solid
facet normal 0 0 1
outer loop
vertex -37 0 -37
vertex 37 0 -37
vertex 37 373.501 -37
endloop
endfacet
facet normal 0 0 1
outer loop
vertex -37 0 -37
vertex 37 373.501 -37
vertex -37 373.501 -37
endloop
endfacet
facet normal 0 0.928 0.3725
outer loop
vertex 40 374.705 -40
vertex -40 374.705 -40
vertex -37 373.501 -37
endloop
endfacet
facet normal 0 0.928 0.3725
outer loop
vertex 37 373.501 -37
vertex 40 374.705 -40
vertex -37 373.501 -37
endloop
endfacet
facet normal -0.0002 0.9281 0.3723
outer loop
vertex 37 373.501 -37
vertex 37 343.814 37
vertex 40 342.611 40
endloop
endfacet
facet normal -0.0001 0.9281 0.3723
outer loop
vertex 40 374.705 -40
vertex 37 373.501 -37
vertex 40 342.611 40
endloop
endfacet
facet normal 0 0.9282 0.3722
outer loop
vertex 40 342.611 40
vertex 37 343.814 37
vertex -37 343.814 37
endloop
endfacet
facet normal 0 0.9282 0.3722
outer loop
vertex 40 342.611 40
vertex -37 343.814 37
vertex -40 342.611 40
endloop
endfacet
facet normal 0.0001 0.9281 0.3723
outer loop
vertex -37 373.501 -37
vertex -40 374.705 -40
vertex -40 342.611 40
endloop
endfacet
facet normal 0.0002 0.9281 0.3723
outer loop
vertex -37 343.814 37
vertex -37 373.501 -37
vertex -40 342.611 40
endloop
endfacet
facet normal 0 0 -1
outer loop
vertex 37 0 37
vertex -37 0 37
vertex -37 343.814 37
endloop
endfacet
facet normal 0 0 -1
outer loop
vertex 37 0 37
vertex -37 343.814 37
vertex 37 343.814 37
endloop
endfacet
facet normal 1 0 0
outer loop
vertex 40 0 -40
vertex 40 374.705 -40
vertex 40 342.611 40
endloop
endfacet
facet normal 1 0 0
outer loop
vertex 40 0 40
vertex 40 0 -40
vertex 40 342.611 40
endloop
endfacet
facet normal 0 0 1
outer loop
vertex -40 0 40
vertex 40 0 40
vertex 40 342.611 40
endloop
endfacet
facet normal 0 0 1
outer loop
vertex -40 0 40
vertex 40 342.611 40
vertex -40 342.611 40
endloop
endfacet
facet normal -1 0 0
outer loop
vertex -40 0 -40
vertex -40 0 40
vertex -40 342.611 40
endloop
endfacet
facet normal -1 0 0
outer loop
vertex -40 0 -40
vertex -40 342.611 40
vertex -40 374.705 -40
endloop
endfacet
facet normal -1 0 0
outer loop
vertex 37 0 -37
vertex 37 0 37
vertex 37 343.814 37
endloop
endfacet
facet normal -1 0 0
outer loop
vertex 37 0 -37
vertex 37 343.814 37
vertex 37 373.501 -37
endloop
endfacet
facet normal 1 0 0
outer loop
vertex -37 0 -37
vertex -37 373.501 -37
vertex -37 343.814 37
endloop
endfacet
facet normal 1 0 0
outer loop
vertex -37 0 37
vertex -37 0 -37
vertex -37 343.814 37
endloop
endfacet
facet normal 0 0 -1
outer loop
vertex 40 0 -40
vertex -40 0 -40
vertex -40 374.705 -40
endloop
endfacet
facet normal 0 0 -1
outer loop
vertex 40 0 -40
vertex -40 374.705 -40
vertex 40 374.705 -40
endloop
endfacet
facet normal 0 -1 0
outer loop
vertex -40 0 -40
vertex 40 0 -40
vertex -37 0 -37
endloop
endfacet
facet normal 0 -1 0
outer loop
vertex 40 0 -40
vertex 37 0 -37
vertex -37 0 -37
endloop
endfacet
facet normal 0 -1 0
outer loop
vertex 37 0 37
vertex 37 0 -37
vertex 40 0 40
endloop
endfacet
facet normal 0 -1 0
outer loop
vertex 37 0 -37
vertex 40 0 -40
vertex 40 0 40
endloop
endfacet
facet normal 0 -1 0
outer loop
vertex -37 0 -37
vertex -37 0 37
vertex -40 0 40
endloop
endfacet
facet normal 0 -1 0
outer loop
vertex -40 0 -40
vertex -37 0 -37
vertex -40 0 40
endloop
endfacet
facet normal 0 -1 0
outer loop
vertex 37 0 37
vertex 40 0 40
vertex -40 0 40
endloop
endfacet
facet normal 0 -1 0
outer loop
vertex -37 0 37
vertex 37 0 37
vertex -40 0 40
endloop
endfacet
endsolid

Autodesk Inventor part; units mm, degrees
ref_plane "YZ Plane" through (0, 0, 0) normal (1, 0, 0) x (0, 1, 0)
ref_plane "XZ Plane" through (0, 0, 0) normal (0, 1, 0) x (-1, 0, 0)
ref_plane "XY Plane" through (0, 0, 0) normal (0, 0, 1) x (1, 0, 0)
sketch "Sketch1" plane through (0, 0, 0) normal (0, 1, 0) x (-1, 0, 0)
  line L0 (40, -40) -> (-40, -40)
  line L1 (-40, -40) -> (-40, 40)
  line L2 (-40, 40) -> (40, 40)
  line L3 (40, 40) -> (40, -40)
  line L4 (40, -40) -> (-40, 40) construction
  line L5 (-40, -40) -> (40, 40) construction
  line L6 (-37, -37) -> (37, -37)
  line L7 (37, -37) -> (37, 37)
  line L8 (37, 37) -> (-37, 37)
  line L9 (-37, 37) -> (-37, -37)
  point P0 (0, 0)
  dimension "d0" = 3
  dimension "d1" = 80
extrude "Extrusion1" add sketch "Sketch1" along normal blind 374.705
sketch "Sketch2" plane through (0, 0, 0) normal (1, 0, 0) x (0, 1, 0)
  line L0 (0, 40) -> (0, -40) construction
  line L1 (0, -40) -> (374.705, -40) projected
  line L2 (374.705, 40) -> (374.705, -40) projected
  line L3 (0, 40) -> (374.705, 40) projected
  line L4 (0, -40) -> (374.705, -40) projected
  line L5 (374.705, -40) -> (342.6109, 40)
  point P0 (0, 0)
  dimension "d4" = 21.86
extrude "Extrusion2" cut sketch "Sketch2" along normal through all both and the other way through all
equation "\"d1\" = Legs_Tube_dim"
equation "\"d4\" = Legs_Tube_cut_angle"
equation "\"Legs_Tube_dim\" = 80"
properties part number "PRS 9681 leg tube_D1200 940"
